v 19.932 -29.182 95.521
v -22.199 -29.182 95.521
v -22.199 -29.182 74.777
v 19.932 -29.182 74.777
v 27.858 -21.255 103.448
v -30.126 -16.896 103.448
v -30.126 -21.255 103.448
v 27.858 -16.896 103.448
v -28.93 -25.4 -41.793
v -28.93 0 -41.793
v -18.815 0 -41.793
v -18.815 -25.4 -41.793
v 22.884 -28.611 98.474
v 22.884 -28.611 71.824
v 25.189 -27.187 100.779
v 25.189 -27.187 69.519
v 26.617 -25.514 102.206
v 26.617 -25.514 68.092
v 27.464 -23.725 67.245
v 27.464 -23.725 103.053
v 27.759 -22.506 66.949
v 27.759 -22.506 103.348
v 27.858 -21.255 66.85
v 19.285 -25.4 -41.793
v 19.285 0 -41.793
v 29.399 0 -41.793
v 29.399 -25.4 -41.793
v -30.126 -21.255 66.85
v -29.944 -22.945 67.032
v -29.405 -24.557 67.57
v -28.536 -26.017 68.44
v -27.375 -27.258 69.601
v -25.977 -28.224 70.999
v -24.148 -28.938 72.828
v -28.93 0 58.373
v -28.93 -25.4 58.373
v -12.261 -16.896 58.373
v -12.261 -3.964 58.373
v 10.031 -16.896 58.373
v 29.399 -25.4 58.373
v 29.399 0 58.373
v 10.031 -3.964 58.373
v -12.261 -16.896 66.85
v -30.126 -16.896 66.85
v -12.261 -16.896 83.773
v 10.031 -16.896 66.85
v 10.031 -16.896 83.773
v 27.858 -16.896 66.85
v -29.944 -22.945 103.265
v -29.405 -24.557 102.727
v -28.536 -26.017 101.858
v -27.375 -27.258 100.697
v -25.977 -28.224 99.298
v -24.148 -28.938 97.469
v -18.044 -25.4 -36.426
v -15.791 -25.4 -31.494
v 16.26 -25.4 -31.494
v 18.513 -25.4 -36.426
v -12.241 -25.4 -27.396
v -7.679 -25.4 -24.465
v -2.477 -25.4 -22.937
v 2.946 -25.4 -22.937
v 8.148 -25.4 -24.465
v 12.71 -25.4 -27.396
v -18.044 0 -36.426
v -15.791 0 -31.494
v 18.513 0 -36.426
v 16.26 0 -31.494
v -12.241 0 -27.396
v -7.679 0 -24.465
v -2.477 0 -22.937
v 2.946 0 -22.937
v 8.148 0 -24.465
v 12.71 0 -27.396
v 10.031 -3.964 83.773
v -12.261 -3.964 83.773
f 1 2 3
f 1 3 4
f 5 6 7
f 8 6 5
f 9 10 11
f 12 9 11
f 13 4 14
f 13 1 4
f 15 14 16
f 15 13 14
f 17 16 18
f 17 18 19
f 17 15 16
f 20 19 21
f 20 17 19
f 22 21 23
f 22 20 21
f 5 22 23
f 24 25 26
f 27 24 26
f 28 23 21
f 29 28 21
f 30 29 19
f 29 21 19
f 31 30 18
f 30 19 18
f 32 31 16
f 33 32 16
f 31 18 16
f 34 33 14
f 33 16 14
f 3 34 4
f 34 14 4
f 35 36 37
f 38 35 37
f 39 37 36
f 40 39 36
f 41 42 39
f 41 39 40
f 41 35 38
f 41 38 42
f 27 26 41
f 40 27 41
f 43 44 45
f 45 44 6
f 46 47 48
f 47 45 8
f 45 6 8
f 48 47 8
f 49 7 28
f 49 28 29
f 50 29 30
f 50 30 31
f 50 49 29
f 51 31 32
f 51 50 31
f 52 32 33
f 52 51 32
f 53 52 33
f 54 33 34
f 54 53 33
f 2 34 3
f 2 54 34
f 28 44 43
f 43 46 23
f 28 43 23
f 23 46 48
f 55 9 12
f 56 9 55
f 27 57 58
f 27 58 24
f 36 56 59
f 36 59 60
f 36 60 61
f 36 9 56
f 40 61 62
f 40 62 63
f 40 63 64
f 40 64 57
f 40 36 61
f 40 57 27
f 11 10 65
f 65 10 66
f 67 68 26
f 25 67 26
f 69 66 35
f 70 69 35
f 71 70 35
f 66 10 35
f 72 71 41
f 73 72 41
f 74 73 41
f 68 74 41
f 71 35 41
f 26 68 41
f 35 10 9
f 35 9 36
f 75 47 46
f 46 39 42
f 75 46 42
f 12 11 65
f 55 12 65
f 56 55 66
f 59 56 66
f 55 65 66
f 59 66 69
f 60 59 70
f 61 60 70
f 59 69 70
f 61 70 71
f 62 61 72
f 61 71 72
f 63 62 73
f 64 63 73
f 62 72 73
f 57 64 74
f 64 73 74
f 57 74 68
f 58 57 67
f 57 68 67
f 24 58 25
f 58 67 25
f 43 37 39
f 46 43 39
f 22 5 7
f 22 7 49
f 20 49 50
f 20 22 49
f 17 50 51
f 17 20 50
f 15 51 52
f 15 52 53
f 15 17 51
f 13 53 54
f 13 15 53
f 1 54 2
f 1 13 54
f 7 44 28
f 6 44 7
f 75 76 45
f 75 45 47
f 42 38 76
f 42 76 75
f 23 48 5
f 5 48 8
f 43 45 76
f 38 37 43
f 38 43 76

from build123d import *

# Parameters (mm, degrees)
F0_W     = 58.329247
F0_H     = 100.166194
F1_DEPTH = 25.4
F3_D     = 38.1
F5_W     = 22.291495
F5_H     = 12.931229
F6_DEPTH = 25.4
F8_W     = 57.983957
F8_H     = 36.597609
F9_DEPTH = 12.285994
F10_R    = 7.926633


with BuildPart() as f1:
    # F0 (on Front) → F1 (new body)
    with BuildSketch(Plane.XZ):
        with Locations((0.23458, 8.289784)):
            Rectangle(F0_W, F0_H)
    extrude(amount=F1_DEPTH)

    # F3 (through all)
    with Locations(Plane.XZ.offset(25.4)):
        with Locations((0.23458, -41.793313)):
            Hole(F3_D / 2)

    # F5 (on face) → F6 (join)
    with BuildSketch(Plane.XY.offset(58.372881)):
        with Locations((-1.115124, -10.430084)):
            Rectangle(F5_W, F5_H)
    extrude(amount=F6_DEPTH)

    # F8 (on face) → F9 (join)
    with BuildSketch(Plane.XZ.offset(16.895698)):
        with Locations((-1.133726, 85.148781)):
            Rectangle(F8_W, F8_H)
    extrude(amount=F9_DEPTH)

    # F10
    f10_edges = [f1.edges().sort_by_distance(p)[0] for p in [
        (27.858253, -29.181693, 85.148782),
        (-1.133725, -29.181693, 103.447586),
        (-1.133725, -29.181693, 66.849977),
        (-30.125704, -29.181693, 85.148782),
    ]]
    fillet(f10_edges, radius=F10_R)


solid = f1.part
